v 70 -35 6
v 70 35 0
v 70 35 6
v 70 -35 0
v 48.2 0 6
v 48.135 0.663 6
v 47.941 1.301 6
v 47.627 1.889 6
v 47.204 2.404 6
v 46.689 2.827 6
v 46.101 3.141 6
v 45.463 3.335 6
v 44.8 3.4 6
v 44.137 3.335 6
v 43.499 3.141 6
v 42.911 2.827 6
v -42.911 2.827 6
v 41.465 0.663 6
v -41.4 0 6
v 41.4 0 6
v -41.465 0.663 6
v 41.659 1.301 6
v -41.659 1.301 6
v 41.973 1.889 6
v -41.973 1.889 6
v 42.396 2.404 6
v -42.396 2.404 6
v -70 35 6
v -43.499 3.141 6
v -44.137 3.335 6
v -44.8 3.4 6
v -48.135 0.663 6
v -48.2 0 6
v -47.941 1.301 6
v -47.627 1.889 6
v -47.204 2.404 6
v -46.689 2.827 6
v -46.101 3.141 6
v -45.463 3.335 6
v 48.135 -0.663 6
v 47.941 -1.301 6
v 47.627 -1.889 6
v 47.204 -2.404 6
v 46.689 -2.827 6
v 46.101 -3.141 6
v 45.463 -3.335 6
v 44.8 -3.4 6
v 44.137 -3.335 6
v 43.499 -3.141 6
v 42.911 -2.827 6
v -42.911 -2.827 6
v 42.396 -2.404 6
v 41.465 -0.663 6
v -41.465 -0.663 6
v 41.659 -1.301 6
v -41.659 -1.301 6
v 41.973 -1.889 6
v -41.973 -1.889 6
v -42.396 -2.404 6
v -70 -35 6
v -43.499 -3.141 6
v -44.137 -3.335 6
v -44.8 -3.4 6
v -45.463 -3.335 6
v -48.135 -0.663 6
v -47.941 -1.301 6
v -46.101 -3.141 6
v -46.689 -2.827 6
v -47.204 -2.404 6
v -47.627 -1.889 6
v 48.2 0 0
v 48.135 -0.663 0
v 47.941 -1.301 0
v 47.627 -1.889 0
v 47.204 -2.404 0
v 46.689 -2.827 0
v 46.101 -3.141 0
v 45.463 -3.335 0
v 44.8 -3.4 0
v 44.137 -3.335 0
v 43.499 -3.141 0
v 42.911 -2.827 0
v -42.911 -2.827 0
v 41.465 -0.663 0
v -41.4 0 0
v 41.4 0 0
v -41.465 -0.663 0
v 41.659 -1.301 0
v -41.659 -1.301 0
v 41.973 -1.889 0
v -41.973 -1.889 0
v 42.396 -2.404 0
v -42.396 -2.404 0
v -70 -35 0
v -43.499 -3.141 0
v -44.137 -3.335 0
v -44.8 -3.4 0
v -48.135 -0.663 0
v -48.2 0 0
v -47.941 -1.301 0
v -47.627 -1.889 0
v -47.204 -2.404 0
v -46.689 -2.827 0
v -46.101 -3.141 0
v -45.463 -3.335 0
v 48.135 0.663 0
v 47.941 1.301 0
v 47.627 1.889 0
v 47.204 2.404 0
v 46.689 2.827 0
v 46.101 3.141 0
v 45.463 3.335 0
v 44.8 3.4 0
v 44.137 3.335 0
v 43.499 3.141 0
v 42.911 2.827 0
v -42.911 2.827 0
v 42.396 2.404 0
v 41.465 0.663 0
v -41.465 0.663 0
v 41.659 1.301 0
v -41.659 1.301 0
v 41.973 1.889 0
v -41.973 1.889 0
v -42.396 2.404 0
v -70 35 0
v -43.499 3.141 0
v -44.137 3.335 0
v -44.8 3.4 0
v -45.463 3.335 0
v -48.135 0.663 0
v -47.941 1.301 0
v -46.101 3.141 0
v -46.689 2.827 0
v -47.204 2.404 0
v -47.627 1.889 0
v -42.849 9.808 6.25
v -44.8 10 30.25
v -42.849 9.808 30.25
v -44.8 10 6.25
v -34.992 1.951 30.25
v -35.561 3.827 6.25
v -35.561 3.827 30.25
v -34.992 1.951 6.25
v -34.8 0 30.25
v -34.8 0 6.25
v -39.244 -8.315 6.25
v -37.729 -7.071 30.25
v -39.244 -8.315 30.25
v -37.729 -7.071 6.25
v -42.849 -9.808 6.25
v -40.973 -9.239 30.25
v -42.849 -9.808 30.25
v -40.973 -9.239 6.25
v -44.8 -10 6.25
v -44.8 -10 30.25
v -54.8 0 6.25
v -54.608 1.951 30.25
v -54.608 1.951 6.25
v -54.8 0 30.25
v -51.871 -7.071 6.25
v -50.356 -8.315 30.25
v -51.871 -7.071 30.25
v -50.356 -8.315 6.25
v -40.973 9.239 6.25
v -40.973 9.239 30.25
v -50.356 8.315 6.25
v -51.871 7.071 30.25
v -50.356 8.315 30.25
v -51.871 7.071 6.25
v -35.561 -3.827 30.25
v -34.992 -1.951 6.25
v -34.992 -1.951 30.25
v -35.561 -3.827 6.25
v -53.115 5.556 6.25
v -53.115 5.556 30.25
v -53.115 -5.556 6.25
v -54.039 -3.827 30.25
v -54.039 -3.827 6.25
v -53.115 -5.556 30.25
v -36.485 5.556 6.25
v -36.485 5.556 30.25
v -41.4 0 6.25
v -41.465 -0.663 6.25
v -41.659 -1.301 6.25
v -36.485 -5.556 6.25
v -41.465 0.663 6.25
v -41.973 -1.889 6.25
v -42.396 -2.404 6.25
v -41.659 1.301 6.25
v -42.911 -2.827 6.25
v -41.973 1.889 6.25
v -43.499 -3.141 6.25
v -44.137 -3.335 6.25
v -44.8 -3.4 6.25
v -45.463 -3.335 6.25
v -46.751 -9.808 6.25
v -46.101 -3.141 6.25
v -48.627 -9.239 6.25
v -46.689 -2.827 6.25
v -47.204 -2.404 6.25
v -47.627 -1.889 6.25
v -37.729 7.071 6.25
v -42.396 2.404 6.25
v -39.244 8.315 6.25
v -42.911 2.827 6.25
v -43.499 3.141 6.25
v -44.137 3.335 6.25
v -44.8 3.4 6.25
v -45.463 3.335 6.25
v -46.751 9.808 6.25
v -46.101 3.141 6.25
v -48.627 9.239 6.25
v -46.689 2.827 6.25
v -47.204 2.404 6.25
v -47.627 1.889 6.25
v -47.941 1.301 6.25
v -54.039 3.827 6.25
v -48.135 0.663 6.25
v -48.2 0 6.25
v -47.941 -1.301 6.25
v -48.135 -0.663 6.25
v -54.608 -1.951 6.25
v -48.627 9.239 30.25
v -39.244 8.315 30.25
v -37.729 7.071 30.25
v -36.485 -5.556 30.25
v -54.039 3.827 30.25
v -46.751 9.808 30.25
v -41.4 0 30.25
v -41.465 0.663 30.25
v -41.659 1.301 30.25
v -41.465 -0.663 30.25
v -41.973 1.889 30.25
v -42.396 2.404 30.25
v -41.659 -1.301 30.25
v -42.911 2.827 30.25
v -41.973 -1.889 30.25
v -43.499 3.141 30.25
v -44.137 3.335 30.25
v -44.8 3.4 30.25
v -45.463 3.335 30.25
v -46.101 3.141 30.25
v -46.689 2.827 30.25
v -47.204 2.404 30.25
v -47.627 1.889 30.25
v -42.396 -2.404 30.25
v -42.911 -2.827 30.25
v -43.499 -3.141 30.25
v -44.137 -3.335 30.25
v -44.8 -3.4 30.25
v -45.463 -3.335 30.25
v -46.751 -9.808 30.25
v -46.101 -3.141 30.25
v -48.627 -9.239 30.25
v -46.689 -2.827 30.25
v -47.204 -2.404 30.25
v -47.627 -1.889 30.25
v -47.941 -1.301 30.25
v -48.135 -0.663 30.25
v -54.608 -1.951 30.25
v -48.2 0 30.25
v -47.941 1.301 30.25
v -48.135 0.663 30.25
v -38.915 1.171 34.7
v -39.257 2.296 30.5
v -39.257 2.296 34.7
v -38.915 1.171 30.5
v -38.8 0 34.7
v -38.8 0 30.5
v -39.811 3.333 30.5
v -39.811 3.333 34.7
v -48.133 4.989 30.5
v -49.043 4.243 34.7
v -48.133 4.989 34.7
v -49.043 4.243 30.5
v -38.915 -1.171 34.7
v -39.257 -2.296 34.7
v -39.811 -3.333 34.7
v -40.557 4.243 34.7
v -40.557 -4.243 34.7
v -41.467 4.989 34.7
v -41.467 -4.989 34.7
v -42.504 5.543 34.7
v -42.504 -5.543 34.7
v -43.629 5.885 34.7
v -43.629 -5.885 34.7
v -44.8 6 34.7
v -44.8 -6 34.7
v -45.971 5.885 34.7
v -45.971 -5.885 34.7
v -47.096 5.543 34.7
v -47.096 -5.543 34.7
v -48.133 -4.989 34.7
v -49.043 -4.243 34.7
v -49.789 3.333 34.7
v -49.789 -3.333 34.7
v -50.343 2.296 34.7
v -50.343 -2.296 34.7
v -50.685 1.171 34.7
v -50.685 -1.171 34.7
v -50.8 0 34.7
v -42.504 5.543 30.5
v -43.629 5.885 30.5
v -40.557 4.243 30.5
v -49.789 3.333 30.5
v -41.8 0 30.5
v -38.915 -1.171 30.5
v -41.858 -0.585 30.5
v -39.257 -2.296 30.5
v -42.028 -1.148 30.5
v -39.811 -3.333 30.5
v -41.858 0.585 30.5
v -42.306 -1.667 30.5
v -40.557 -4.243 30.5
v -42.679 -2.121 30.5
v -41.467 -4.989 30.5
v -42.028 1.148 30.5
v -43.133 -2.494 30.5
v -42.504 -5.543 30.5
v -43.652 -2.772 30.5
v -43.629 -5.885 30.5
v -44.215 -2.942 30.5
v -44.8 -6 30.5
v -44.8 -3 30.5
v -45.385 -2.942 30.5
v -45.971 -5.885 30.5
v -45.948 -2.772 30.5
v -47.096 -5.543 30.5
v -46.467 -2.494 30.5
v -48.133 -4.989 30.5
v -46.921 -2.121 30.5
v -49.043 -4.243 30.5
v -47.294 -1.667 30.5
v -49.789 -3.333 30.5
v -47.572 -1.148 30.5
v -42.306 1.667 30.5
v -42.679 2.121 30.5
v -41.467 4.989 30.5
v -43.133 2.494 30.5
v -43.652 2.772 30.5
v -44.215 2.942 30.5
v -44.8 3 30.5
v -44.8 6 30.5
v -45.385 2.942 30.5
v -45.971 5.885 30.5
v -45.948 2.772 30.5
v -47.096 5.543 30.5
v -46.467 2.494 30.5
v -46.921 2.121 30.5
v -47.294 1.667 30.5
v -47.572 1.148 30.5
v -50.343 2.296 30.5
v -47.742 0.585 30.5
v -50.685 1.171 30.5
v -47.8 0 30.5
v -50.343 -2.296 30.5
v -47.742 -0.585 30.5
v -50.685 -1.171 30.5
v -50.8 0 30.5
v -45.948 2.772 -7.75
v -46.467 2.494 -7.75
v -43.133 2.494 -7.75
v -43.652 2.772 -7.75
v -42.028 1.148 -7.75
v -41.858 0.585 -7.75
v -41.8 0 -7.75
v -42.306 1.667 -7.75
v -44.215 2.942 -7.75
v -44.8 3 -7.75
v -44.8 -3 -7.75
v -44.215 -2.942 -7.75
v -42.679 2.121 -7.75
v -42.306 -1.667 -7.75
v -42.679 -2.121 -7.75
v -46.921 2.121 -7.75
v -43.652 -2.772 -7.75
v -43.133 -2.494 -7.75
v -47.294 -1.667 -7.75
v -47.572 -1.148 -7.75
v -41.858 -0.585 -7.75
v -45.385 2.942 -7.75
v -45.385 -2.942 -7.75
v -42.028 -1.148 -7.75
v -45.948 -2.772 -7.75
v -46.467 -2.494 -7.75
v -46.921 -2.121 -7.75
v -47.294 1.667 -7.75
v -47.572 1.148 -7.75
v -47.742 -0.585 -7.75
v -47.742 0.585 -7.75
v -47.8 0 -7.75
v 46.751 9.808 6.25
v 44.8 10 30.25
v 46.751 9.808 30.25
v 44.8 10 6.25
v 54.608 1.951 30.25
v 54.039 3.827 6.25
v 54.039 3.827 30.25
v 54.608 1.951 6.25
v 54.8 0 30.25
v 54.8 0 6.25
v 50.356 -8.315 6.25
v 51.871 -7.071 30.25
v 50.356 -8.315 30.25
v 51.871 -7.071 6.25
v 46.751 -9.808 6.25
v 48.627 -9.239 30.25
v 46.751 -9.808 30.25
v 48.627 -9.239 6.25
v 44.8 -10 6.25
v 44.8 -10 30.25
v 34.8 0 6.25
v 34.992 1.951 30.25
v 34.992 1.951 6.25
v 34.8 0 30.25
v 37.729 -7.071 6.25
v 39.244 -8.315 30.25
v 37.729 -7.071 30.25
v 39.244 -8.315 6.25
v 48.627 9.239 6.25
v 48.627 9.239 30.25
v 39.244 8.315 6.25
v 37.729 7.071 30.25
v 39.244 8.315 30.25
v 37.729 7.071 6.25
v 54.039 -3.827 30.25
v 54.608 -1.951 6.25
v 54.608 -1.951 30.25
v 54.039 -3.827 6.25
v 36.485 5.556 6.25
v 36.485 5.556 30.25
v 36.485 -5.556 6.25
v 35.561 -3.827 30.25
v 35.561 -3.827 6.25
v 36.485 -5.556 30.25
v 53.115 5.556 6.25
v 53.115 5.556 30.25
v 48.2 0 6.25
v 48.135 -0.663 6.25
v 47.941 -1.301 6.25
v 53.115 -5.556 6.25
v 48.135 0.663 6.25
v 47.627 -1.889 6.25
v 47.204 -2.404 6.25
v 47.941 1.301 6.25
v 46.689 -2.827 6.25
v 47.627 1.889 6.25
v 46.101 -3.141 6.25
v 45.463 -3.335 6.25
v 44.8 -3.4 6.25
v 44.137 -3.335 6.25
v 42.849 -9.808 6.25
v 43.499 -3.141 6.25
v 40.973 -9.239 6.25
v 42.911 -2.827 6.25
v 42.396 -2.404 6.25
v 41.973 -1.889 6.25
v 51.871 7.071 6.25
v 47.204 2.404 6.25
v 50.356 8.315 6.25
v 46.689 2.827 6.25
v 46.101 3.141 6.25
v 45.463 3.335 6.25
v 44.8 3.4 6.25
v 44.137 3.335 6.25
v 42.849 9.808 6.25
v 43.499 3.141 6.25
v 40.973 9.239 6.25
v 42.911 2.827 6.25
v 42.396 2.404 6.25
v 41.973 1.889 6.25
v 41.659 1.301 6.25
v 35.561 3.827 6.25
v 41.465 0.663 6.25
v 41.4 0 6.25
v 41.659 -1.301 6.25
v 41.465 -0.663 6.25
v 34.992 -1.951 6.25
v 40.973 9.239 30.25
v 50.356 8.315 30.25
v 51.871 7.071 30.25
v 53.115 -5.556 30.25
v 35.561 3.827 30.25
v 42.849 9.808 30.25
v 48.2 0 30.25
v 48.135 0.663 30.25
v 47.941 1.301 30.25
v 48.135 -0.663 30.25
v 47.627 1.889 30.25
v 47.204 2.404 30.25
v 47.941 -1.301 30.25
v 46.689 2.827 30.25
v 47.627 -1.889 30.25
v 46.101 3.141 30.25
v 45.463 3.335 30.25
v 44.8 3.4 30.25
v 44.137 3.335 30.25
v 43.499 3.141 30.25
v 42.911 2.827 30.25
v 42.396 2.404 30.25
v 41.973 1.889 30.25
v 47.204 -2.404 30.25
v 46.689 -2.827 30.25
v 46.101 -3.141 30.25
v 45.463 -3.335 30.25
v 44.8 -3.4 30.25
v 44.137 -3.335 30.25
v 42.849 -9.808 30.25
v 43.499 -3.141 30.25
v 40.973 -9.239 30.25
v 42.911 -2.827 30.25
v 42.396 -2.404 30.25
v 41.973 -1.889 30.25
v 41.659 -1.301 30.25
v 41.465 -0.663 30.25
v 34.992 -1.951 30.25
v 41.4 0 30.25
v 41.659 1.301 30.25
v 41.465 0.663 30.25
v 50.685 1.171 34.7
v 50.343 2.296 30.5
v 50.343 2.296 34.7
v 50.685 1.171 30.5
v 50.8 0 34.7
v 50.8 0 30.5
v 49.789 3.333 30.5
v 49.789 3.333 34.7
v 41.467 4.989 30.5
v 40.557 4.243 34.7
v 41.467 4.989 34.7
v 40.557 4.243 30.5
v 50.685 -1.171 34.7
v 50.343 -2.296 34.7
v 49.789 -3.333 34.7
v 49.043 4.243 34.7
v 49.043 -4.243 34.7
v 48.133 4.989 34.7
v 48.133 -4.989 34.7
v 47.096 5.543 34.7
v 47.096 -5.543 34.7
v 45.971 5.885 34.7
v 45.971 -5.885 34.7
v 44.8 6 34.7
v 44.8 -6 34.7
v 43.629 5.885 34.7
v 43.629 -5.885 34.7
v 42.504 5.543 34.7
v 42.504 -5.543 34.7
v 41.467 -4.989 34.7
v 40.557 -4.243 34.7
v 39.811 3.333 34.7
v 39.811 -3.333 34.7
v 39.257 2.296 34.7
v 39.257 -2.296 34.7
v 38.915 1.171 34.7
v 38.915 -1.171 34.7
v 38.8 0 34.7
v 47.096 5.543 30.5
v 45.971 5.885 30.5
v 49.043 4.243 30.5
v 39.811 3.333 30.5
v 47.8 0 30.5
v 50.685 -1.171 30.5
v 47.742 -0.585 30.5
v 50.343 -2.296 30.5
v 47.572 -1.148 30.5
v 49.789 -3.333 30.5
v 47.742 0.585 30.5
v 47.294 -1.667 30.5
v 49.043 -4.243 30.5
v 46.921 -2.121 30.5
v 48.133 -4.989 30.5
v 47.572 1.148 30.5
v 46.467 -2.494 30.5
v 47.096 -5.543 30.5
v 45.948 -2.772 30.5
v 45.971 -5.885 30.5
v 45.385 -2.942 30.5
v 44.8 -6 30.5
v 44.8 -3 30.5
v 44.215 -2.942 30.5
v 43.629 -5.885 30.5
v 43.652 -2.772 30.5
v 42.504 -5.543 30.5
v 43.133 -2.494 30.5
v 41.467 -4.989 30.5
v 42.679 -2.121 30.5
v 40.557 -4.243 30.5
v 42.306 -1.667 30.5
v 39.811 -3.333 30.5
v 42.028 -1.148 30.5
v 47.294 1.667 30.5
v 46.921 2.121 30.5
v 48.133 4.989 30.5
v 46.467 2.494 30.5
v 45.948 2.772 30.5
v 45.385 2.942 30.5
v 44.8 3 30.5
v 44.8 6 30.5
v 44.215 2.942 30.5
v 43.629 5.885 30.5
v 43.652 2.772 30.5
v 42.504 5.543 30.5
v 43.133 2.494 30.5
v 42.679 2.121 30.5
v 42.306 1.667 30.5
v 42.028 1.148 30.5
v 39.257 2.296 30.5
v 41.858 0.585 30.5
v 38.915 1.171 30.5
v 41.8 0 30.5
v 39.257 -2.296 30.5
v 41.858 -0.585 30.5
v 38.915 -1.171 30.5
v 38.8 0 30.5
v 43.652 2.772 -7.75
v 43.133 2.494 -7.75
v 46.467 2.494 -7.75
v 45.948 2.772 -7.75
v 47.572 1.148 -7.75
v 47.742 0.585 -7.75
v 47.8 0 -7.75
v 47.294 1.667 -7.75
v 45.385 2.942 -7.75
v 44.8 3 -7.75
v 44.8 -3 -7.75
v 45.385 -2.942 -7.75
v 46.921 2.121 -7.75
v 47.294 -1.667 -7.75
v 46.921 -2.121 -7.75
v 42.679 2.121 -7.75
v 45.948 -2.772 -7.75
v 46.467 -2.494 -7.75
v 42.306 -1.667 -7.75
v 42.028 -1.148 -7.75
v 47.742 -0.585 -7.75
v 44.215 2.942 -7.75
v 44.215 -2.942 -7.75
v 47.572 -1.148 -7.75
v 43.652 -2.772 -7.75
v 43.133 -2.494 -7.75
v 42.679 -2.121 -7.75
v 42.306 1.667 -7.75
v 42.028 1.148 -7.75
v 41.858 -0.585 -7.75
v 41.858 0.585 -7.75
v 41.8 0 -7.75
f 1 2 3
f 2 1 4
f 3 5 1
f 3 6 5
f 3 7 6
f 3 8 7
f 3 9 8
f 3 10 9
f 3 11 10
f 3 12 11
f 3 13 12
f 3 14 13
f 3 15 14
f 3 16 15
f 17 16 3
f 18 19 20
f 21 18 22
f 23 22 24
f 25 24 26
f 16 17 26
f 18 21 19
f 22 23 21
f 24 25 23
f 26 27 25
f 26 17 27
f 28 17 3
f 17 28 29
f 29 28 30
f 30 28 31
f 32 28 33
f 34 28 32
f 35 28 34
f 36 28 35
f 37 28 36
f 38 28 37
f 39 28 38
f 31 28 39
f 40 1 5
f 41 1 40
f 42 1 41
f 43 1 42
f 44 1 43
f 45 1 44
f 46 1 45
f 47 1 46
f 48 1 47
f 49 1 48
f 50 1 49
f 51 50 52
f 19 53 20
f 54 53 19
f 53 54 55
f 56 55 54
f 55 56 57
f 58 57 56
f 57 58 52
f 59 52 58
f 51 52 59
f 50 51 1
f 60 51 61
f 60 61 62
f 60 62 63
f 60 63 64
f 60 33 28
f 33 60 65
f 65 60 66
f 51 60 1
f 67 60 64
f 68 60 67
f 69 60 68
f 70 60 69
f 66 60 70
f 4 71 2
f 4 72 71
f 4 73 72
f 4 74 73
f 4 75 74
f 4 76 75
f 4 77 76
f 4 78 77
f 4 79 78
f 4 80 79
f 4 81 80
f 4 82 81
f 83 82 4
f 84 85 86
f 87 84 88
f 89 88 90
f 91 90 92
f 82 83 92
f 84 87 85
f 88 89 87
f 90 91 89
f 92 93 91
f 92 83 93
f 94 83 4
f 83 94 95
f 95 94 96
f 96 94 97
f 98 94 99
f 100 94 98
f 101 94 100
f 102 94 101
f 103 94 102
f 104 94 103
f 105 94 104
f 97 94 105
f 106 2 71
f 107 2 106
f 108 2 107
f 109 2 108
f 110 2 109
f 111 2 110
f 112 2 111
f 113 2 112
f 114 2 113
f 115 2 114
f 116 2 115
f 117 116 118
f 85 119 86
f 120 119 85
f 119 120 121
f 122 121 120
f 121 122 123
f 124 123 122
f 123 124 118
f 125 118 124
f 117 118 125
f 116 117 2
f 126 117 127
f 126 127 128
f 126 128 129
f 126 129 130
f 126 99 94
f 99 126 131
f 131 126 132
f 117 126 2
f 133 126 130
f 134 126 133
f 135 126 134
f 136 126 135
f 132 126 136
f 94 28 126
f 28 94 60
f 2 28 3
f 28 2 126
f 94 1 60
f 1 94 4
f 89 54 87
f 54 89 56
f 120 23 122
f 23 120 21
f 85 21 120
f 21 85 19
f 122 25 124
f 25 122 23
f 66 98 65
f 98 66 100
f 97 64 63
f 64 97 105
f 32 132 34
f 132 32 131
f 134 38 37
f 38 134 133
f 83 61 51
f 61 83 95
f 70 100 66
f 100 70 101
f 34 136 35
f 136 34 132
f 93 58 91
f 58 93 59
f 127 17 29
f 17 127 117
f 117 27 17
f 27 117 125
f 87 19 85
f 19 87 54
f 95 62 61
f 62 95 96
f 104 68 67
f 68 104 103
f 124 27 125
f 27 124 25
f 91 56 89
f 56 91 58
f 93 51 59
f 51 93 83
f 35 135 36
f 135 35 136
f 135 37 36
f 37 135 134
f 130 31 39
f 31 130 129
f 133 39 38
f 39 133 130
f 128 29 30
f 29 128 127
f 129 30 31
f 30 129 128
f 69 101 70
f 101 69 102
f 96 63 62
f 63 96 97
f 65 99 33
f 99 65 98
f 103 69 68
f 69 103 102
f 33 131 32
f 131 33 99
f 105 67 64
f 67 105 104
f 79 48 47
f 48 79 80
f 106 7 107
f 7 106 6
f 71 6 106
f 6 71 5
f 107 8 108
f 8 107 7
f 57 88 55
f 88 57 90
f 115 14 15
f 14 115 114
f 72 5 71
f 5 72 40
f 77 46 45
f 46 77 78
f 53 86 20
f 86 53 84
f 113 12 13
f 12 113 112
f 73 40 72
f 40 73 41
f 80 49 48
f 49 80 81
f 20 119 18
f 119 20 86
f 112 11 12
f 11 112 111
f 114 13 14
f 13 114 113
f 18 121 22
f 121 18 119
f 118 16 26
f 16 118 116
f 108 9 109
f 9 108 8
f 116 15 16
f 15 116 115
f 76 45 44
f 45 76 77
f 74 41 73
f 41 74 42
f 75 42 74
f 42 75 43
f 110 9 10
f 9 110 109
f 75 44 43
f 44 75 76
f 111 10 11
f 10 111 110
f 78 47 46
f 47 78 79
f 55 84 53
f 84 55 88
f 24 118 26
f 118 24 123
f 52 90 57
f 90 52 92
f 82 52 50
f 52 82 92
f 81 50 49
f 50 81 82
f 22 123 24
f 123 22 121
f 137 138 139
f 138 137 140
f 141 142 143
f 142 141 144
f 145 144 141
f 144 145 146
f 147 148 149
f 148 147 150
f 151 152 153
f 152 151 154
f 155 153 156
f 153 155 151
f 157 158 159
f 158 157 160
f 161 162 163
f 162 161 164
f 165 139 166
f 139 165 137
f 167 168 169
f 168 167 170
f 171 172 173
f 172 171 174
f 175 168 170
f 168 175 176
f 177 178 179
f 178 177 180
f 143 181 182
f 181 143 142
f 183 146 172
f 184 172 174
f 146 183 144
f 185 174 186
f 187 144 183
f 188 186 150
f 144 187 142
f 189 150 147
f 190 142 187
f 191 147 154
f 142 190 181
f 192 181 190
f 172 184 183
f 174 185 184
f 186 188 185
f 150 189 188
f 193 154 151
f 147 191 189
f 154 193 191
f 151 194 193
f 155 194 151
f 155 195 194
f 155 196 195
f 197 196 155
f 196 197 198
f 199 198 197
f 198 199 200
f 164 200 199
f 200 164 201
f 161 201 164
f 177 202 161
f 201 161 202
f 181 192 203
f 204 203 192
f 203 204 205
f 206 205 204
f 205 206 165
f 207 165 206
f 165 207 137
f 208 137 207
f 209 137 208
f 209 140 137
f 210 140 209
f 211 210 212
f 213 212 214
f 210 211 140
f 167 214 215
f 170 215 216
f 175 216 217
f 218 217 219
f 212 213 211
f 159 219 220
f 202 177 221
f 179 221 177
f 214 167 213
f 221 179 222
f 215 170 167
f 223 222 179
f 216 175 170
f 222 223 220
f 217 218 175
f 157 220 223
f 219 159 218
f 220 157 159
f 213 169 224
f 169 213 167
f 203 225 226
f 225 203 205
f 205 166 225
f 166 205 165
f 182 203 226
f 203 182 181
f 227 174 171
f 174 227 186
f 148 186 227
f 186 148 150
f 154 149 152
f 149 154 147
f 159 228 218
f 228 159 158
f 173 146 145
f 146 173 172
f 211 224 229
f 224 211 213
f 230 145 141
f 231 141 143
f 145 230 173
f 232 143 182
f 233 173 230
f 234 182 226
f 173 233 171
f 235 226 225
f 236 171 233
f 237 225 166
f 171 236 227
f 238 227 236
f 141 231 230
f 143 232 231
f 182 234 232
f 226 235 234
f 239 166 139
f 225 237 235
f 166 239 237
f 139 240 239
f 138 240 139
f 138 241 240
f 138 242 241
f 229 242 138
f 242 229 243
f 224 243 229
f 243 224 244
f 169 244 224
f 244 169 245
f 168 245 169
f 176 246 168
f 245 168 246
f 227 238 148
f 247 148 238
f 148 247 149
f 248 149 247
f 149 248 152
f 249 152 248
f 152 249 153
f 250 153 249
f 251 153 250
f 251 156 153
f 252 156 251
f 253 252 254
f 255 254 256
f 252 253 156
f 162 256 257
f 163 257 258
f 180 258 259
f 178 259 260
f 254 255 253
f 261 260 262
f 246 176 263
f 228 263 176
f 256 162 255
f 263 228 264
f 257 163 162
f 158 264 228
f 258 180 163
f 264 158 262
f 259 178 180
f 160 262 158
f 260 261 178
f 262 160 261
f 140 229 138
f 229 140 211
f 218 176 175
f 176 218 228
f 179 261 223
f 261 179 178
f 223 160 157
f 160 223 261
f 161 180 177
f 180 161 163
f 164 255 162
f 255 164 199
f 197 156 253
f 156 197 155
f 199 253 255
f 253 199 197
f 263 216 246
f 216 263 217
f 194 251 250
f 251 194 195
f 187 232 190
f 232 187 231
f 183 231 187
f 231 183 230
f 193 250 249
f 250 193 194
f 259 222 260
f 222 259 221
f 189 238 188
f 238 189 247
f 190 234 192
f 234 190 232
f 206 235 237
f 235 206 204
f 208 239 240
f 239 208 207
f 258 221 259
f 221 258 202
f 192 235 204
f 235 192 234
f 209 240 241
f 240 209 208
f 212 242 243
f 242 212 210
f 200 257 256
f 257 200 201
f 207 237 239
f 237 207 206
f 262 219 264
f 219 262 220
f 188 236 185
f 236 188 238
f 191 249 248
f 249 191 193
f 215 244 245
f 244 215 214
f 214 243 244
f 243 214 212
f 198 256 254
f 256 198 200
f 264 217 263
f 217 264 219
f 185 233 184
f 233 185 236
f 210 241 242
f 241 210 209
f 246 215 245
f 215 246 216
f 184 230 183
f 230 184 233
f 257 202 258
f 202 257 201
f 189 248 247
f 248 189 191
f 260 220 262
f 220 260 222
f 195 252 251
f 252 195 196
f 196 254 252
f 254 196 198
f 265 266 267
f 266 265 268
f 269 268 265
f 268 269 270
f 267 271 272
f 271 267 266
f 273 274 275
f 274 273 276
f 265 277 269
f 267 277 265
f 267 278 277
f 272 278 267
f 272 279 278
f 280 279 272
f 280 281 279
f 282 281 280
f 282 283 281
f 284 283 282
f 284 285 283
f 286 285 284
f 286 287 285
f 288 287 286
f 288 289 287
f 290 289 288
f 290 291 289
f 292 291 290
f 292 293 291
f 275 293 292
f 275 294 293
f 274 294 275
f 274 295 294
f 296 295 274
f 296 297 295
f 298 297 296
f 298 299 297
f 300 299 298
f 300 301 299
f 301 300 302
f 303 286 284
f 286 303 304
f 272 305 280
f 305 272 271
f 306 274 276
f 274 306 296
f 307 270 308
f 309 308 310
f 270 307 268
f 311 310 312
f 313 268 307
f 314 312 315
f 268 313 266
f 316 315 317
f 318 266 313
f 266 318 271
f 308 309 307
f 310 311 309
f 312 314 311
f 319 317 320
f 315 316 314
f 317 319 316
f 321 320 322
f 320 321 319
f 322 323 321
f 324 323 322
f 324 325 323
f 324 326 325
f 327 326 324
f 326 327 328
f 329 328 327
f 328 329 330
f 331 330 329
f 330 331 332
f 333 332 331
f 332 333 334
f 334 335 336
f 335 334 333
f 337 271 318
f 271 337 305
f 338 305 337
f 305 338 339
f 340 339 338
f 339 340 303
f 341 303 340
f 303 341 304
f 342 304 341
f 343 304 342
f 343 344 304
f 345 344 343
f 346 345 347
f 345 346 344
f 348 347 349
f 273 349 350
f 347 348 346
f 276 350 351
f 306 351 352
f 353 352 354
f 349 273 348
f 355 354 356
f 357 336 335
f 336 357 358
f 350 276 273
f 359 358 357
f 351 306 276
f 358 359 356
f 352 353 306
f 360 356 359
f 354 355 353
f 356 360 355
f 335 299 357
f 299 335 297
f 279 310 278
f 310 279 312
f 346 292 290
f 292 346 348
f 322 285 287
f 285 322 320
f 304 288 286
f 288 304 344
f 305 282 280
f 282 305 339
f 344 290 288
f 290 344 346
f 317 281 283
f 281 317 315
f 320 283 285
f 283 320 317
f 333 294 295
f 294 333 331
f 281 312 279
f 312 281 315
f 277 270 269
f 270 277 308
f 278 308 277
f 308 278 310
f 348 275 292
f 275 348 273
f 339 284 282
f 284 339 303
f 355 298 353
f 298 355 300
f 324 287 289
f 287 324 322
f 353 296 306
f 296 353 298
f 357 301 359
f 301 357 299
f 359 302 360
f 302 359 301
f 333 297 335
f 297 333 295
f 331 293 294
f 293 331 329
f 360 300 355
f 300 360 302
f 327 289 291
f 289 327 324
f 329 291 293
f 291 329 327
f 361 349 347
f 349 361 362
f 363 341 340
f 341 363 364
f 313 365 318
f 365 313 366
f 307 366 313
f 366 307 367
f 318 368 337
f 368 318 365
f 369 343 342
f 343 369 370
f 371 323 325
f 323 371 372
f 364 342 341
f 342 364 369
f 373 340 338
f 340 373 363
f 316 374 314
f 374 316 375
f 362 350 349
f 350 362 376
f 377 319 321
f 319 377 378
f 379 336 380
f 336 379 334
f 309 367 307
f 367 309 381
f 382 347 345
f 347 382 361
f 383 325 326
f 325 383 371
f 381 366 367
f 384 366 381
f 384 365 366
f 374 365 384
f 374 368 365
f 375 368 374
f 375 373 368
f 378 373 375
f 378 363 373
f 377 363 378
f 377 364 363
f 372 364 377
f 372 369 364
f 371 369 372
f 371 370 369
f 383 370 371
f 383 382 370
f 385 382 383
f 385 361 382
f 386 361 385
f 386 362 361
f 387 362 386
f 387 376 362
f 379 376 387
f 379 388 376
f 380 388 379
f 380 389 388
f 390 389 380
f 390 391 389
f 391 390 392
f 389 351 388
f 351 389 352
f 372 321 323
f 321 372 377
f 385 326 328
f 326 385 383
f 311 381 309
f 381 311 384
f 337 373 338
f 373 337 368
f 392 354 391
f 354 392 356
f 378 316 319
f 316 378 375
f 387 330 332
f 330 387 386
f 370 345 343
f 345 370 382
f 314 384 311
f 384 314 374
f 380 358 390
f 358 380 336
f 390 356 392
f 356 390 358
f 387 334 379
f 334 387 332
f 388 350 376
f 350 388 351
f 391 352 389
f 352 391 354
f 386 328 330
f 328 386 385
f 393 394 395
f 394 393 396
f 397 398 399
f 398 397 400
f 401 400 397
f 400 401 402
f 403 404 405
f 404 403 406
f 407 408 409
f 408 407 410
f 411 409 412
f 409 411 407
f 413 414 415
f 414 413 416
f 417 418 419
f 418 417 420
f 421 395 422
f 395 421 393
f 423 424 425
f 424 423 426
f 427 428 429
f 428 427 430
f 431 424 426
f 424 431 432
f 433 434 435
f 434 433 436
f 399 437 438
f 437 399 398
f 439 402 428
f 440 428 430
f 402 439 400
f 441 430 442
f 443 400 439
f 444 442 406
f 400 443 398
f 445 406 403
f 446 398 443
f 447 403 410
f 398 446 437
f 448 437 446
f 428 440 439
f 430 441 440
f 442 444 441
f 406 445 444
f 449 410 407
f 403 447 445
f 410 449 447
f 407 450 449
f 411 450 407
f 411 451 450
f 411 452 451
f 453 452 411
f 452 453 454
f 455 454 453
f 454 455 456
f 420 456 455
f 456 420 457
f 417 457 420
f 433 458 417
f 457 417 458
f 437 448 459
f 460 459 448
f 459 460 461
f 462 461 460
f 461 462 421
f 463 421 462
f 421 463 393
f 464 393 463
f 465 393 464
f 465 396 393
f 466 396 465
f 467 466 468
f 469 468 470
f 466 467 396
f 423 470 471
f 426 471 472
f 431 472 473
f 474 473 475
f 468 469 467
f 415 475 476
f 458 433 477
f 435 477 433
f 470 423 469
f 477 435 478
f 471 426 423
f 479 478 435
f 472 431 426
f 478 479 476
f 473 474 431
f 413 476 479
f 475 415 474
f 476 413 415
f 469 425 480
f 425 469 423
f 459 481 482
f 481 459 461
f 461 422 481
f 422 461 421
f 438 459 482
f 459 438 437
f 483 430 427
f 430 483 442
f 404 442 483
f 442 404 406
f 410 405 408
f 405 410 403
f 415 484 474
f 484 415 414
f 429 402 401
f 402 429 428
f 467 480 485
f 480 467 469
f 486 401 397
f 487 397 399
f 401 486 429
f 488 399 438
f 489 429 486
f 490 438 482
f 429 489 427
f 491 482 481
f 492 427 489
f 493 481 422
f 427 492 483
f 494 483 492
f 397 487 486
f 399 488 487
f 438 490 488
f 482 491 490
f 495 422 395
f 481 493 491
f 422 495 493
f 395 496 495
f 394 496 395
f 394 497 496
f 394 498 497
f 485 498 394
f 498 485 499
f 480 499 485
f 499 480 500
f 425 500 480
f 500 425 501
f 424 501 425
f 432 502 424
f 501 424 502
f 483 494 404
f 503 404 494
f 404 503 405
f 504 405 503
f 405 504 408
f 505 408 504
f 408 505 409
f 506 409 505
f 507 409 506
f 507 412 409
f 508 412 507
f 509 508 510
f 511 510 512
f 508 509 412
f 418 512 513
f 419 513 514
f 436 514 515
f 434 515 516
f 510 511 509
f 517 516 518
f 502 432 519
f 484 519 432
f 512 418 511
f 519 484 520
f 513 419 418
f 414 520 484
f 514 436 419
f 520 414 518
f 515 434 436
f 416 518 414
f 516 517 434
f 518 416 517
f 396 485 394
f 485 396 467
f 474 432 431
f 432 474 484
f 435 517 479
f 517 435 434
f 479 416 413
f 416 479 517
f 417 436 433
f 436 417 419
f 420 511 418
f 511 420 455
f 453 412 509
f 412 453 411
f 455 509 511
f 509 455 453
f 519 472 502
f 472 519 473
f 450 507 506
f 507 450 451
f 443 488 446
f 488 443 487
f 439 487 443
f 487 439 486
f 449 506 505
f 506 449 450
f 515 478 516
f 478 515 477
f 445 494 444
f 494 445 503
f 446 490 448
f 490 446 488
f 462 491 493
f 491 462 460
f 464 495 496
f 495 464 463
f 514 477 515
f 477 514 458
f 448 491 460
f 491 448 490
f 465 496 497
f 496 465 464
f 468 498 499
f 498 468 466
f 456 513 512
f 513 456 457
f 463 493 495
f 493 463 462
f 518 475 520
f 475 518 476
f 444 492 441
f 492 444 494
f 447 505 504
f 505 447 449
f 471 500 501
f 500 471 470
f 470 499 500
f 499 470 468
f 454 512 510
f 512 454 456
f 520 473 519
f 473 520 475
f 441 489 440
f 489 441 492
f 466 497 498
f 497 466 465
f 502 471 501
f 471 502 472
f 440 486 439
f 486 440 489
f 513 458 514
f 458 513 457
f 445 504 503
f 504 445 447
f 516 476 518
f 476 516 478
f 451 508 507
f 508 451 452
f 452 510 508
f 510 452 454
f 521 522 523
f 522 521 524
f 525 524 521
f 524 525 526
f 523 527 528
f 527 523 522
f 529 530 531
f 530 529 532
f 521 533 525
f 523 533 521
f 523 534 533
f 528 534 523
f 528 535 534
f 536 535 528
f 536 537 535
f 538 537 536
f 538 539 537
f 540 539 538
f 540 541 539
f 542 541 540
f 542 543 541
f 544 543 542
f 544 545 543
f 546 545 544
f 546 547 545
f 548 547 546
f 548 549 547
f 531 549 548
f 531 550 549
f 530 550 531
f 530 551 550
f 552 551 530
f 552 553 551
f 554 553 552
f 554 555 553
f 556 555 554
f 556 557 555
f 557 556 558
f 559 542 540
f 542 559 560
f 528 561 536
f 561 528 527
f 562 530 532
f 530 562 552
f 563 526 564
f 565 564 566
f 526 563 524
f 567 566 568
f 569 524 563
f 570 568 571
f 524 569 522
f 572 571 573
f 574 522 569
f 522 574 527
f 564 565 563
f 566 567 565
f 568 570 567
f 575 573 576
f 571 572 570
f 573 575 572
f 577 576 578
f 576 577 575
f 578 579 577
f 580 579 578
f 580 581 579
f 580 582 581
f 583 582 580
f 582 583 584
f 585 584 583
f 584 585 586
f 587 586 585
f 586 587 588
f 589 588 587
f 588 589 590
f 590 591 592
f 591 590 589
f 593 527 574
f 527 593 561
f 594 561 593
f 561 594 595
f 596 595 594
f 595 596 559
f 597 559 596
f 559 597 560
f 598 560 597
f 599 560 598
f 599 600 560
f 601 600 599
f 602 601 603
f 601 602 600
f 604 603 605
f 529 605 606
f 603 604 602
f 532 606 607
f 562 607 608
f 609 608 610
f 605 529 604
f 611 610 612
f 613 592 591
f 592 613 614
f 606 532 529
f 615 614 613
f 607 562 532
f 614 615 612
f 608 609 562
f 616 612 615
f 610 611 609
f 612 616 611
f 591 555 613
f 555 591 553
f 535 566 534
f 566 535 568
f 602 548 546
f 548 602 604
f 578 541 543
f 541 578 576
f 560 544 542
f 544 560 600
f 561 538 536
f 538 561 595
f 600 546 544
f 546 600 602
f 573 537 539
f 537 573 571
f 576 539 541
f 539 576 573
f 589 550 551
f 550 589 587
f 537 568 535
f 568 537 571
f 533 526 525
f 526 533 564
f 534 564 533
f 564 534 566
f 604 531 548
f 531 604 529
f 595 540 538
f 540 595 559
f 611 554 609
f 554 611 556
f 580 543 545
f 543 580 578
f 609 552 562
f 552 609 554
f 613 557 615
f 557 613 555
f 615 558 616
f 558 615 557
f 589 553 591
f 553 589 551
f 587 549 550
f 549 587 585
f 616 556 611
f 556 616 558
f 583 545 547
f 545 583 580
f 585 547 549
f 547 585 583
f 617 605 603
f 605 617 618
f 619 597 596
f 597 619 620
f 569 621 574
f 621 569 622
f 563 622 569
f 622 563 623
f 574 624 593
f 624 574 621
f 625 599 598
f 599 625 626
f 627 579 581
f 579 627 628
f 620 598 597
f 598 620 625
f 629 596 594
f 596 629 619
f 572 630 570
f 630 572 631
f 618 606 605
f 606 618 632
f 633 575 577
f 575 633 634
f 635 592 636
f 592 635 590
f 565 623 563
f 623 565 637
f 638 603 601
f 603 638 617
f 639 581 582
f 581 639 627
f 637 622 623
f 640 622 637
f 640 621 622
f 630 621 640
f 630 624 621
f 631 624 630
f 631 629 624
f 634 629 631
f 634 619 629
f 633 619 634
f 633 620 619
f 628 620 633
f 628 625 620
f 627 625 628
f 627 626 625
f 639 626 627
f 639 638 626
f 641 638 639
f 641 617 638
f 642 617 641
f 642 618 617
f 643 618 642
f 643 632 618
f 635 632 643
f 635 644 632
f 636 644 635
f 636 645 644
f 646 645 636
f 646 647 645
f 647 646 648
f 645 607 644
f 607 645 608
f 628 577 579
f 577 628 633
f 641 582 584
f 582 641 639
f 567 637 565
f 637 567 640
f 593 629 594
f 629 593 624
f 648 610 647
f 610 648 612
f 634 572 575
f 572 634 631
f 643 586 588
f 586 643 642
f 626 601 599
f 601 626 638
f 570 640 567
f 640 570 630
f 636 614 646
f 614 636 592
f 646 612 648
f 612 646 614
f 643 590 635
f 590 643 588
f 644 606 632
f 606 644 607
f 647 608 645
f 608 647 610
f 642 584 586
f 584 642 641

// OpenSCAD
$fn = 32;

// ------------------------------------------------------------------------
// Standoff columns: 2 d20 standoffs, bolts d6
// Every part is its own module, assembly() places them once.
// ------------------------------------------------------------------------

// --- part 1 ---
module base_plate() {
  difference() {
    translate([-70, -35, 0]) cube([140, 70, 6]);
    translate([-44.8, 0, -1]) cylinder(h = 8, d = 6.8);
    translate([44.8, 0, -1]) cylinder(h = 8, d = 6.8);
  }
}

// --- part 2 ---
module spacer1() {
  difference() {
      translate([0, 0, 0]) cylinder(h = 24, d = 20);
      translate([0, 0, -1]) cylinder(h = 26, d = 6.8);
    }
}

// --- part 3 ---
module bolt1() {
  cylinder(h = 4.2, d = 12);
  translate([0, 0, -38.25]) cylinder(h = 38.25, d = 6);
}

// --- part 4 ---
module spacer2() {
  difference() {
      translate([0, 0, 0]) cylinder(h = 24, d = 20);
      translate([0, 0, -1]) cylinder(h = 26, d = 6.8);
    }
}

// --- part 5 ---
module bolt2() {
  cylinder(h = 4.2, d = 12);
  translate([0, 0, -38.25]) cylinder(h = 38.25, d = 6);
}

// --- assembly ---
module assembly() {
  translate([0, 0, 0]) rotate([0, 0, 0]) base_plate();
  translate([-44.8, 0, 6.25]) rotate([0, 0, 0]) spacer1();
  translate([-44.8, 0, 30.5]) rotate([0, 0, 0]) bolt1();
  translate([44.8, 0, 6.25]) rotate([0, 0, 0]) spacer2();
  translate([44.8, 0, 30.5]) rotate([0, 0, 0]) bolt2();
}

assembly();
